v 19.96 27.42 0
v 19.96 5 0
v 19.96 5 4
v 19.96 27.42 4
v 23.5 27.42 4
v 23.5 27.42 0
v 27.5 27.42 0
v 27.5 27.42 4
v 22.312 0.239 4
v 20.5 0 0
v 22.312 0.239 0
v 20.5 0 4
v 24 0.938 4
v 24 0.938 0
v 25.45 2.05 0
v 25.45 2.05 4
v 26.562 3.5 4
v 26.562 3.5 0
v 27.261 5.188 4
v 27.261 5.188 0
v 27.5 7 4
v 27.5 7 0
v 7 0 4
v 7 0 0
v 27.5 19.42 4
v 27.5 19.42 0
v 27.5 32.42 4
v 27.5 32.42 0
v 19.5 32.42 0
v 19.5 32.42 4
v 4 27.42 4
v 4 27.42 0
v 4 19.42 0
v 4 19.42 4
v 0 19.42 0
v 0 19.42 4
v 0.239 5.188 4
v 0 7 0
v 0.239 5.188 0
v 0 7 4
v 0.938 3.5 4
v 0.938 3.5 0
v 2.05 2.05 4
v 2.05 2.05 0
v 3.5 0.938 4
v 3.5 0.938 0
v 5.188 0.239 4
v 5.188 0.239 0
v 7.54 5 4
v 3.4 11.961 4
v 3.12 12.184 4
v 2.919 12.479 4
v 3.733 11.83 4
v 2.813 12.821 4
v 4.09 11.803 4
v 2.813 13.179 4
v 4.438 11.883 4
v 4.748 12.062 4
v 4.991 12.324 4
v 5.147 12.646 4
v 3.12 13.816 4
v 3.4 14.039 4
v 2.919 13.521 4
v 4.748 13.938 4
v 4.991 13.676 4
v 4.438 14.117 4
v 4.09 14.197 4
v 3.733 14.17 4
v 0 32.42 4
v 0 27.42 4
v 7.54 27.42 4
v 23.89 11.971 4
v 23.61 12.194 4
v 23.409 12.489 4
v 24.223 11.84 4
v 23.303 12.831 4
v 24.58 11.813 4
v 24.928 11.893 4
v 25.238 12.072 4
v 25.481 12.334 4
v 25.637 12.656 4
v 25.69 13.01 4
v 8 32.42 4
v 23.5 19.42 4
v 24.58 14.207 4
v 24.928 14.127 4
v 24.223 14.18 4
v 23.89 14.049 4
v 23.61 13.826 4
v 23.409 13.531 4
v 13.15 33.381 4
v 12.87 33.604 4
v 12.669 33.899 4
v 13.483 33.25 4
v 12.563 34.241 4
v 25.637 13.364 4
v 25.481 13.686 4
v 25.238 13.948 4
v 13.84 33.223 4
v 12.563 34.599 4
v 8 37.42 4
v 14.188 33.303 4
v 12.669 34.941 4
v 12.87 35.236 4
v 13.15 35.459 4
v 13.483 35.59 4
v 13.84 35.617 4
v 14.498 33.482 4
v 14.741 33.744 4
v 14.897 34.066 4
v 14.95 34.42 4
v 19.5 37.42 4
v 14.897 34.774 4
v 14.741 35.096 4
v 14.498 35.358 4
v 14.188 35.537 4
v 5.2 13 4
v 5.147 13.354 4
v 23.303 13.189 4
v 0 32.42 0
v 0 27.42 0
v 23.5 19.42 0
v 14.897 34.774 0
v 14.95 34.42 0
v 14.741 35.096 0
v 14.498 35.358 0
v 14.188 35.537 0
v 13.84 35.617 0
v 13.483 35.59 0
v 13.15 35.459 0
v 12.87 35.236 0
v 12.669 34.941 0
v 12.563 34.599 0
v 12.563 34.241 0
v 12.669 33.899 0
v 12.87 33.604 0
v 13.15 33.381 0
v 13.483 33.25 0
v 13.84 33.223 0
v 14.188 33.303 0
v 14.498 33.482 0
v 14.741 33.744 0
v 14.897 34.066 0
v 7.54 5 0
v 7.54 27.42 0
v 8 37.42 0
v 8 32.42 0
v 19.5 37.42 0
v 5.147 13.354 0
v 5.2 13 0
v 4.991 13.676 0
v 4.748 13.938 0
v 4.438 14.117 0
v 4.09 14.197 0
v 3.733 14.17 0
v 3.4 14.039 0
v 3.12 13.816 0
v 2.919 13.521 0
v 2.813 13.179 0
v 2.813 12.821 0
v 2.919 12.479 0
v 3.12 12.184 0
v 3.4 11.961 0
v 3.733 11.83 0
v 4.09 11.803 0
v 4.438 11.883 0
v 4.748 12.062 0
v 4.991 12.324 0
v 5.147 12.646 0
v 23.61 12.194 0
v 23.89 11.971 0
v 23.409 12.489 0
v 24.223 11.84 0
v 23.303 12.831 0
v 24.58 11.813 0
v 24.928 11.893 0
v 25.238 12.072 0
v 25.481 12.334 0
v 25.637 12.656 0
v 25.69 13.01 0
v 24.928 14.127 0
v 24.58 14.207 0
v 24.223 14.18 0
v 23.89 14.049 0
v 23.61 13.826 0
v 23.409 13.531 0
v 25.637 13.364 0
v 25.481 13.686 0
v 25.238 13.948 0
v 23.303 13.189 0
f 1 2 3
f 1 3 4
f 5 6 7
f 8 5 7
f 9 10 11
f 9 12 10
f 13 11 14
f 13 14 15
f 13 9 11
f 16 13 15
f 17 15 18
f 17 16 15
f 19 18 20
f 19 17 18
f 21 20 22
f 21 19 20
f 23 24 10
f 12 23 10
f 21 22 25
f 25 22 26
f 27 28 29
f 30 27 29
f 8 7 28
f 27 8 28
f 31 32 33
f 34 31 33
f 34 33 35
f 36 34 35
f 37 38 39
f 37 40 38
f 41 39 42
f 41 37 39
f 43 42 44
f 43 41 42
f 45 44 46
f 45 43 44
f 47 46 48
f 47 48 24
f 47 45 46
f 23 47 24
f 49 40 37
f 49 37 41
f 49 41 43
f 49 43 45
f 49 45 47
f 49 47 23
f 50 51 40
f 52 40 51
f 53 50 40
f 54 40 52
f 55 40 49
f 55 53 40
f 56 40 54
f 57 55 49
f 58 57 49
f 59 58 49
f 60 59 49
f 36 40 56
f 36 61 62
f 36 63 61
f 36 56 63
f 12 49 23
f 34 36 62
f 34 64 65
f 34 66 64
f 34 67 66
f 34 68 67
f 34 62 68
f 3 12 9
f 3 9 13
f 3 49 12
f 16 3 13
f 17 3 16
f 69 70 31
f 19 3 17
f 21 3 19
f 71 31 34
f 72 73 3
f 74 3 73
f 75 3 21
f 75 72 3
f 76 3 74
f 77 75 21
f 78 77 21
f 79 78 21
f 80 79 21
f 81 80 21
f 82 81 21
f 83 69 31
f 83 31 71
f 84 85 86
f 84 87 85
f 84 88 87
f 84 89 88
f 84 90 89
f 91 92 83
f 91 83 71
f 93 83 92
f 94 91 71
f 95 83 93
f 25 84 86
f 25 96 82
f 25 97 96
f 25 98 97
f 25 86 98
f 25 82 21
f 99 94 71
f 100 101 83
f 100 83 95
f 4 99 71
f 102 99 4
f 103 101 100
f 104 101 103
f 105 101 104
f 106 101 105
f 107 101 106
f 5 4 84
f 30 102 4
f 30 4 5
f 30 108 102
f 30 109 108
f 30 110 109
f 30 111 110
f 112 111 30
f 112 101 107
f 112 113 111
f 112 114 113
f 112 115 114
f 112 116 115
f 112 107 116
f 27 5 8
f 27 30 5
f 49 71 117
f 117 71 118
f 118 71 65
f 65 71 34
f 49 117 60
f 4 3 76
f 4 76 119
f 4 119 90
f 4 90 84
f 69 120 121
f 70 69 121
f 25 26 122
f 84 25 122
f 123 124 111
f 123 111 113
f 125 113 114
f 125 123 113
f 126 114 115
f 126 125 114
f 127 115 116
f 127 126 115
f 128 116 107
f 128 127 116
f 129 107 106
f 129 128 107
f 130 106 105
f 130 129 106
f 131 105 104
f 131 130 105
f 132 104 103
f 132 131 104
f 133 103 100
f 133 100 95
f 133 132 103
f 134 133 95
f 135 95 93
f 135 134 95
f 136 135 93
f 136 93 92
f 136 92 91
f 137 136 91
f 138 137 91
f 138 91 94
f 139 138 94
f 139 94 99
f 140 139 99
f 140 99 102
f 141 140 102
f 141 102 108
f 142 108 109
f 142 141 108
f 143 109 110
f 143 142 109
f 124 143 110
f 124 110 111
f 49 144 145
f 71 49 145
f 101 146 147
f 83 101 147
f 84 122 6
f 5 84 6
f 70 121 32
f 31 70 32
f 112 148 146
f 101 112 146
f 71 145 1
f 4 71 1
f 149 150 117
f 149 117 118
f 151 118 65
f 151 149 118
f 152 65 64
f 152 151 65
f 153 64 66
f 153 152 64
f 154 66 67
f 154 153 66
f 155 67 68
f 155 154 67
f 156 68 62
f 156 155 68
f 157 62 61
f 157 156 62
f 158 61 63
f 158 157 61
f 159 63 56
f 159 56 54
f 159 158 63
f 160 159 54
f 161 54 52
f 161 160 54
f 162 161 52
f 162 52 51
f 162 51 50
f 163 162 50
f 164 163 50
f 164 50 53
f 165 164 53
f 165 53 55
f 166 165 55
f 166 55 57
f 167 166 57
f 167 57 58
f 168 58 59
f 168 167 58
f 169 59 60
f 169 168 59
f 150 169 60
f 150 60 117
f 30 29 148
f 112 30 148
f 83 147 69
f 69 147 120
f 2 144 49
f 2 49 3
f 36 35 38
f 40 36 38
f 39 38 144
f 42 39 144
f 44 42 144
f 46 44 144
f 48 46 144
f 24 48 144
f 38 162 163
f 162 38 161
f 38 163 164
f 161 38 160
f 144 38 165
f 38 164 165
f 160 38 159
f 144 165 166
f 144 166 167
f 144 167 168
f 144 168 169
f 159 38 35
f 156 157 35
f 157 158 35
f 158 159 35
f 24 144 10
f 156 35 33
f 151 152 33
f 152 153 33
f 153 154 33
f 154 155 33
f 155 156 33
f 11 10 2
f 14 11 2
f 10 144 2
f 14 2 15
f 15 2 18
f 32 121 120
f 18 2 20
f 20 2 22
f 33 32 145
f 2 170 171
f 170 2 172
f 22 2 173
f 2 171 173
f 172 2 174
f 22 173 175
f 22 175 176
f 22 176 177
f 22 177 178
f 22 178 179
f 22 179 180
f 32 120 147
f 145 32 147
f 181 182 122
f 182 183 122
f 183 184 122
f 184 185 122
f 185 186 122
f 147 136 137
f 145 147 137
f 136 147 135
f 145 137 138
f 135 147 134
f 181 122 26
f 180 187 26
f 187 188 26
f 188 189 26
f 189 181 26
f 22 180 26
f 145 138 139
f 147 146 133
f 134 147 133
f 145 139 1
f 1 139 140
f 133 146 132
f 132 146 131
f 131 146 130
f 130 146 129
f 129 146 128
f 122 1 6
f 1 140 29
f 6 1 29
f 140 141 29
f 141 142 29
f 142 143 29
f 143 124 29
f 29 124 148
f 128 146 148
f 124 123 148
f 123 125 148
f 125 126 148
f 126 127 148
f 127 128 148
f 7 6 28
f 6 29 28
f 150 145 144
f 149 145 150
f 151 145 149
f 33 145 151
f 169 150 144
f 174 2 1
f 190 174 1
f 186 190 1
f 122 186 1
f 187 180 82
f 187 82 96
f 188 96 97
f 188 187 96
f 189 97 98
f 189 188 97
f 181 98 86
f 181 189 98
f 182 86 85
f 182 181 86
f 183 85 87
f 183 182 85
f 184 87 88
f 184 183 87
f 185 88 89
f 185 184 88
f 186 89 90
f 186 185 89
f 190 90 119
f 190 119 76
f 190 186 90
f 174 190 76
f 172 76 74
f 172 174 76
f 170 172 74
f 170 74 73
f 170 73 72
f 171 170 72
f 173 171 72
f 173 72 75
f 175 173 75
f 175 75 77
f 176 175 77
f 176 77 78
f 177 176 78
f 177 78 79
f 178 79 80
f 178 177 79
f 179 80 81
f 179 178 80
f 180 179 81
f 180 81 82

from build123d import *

# Parameters (mm, degrees)
SKETCH1_R           = 1.2
SKETCH1_W           = 12.42
SKETCH1_H           = 22.42
BOSS_EXTRUDE1_DEPTH = 4
FILLET1_R           = 7


with BuildPart() as part:
    # Sketch1 → Boss-Extrude1 (new body)
    with BuildSketch(Plane.XY):
        Polygon((8, 37.42), (8, 32.42), (0, 32.42), (0, 27.42), (4, 27.42), (4, 19.42), (0, 19.42), (0, 0), (27.5, 0), (27.5, 19.42), (23.5, 19.42), (23.5, 27.42), (27.5, 27.42), (27.5, 32.42), (19.5, 32.42), (19.5, 37.42), align=None)
        with Locations((4, 13)):
            Circle(SKETCH1_R, mode=Mode.SUBTRACT)
        with Locations((13.75, 16.21)):
            Rectangle(SKETCH1_W, SKETCH1_H, mode=Mode.SUBTRACT)
        with Locations((24.49, 13.01)):
            Circle(SKETCH1_R, mode=Mode.SUBTRACT)
        with Locations((13.75, 34.42)):
            Circle(SKETCH1_R, mode=Mode.SUBTRACT)
    extrude(amount=BOSS_EXTRUDE1_DEPTH)

    # Fillet1
    fillet1_edges = [part.edges().sort_by_distance(p)[0] for p in [
        (27.5, 0, 2),
        (0, 0, 2),
    ]]
    fillet(fillet1_edges, radius=FILLET1_R)


solid = part.part
